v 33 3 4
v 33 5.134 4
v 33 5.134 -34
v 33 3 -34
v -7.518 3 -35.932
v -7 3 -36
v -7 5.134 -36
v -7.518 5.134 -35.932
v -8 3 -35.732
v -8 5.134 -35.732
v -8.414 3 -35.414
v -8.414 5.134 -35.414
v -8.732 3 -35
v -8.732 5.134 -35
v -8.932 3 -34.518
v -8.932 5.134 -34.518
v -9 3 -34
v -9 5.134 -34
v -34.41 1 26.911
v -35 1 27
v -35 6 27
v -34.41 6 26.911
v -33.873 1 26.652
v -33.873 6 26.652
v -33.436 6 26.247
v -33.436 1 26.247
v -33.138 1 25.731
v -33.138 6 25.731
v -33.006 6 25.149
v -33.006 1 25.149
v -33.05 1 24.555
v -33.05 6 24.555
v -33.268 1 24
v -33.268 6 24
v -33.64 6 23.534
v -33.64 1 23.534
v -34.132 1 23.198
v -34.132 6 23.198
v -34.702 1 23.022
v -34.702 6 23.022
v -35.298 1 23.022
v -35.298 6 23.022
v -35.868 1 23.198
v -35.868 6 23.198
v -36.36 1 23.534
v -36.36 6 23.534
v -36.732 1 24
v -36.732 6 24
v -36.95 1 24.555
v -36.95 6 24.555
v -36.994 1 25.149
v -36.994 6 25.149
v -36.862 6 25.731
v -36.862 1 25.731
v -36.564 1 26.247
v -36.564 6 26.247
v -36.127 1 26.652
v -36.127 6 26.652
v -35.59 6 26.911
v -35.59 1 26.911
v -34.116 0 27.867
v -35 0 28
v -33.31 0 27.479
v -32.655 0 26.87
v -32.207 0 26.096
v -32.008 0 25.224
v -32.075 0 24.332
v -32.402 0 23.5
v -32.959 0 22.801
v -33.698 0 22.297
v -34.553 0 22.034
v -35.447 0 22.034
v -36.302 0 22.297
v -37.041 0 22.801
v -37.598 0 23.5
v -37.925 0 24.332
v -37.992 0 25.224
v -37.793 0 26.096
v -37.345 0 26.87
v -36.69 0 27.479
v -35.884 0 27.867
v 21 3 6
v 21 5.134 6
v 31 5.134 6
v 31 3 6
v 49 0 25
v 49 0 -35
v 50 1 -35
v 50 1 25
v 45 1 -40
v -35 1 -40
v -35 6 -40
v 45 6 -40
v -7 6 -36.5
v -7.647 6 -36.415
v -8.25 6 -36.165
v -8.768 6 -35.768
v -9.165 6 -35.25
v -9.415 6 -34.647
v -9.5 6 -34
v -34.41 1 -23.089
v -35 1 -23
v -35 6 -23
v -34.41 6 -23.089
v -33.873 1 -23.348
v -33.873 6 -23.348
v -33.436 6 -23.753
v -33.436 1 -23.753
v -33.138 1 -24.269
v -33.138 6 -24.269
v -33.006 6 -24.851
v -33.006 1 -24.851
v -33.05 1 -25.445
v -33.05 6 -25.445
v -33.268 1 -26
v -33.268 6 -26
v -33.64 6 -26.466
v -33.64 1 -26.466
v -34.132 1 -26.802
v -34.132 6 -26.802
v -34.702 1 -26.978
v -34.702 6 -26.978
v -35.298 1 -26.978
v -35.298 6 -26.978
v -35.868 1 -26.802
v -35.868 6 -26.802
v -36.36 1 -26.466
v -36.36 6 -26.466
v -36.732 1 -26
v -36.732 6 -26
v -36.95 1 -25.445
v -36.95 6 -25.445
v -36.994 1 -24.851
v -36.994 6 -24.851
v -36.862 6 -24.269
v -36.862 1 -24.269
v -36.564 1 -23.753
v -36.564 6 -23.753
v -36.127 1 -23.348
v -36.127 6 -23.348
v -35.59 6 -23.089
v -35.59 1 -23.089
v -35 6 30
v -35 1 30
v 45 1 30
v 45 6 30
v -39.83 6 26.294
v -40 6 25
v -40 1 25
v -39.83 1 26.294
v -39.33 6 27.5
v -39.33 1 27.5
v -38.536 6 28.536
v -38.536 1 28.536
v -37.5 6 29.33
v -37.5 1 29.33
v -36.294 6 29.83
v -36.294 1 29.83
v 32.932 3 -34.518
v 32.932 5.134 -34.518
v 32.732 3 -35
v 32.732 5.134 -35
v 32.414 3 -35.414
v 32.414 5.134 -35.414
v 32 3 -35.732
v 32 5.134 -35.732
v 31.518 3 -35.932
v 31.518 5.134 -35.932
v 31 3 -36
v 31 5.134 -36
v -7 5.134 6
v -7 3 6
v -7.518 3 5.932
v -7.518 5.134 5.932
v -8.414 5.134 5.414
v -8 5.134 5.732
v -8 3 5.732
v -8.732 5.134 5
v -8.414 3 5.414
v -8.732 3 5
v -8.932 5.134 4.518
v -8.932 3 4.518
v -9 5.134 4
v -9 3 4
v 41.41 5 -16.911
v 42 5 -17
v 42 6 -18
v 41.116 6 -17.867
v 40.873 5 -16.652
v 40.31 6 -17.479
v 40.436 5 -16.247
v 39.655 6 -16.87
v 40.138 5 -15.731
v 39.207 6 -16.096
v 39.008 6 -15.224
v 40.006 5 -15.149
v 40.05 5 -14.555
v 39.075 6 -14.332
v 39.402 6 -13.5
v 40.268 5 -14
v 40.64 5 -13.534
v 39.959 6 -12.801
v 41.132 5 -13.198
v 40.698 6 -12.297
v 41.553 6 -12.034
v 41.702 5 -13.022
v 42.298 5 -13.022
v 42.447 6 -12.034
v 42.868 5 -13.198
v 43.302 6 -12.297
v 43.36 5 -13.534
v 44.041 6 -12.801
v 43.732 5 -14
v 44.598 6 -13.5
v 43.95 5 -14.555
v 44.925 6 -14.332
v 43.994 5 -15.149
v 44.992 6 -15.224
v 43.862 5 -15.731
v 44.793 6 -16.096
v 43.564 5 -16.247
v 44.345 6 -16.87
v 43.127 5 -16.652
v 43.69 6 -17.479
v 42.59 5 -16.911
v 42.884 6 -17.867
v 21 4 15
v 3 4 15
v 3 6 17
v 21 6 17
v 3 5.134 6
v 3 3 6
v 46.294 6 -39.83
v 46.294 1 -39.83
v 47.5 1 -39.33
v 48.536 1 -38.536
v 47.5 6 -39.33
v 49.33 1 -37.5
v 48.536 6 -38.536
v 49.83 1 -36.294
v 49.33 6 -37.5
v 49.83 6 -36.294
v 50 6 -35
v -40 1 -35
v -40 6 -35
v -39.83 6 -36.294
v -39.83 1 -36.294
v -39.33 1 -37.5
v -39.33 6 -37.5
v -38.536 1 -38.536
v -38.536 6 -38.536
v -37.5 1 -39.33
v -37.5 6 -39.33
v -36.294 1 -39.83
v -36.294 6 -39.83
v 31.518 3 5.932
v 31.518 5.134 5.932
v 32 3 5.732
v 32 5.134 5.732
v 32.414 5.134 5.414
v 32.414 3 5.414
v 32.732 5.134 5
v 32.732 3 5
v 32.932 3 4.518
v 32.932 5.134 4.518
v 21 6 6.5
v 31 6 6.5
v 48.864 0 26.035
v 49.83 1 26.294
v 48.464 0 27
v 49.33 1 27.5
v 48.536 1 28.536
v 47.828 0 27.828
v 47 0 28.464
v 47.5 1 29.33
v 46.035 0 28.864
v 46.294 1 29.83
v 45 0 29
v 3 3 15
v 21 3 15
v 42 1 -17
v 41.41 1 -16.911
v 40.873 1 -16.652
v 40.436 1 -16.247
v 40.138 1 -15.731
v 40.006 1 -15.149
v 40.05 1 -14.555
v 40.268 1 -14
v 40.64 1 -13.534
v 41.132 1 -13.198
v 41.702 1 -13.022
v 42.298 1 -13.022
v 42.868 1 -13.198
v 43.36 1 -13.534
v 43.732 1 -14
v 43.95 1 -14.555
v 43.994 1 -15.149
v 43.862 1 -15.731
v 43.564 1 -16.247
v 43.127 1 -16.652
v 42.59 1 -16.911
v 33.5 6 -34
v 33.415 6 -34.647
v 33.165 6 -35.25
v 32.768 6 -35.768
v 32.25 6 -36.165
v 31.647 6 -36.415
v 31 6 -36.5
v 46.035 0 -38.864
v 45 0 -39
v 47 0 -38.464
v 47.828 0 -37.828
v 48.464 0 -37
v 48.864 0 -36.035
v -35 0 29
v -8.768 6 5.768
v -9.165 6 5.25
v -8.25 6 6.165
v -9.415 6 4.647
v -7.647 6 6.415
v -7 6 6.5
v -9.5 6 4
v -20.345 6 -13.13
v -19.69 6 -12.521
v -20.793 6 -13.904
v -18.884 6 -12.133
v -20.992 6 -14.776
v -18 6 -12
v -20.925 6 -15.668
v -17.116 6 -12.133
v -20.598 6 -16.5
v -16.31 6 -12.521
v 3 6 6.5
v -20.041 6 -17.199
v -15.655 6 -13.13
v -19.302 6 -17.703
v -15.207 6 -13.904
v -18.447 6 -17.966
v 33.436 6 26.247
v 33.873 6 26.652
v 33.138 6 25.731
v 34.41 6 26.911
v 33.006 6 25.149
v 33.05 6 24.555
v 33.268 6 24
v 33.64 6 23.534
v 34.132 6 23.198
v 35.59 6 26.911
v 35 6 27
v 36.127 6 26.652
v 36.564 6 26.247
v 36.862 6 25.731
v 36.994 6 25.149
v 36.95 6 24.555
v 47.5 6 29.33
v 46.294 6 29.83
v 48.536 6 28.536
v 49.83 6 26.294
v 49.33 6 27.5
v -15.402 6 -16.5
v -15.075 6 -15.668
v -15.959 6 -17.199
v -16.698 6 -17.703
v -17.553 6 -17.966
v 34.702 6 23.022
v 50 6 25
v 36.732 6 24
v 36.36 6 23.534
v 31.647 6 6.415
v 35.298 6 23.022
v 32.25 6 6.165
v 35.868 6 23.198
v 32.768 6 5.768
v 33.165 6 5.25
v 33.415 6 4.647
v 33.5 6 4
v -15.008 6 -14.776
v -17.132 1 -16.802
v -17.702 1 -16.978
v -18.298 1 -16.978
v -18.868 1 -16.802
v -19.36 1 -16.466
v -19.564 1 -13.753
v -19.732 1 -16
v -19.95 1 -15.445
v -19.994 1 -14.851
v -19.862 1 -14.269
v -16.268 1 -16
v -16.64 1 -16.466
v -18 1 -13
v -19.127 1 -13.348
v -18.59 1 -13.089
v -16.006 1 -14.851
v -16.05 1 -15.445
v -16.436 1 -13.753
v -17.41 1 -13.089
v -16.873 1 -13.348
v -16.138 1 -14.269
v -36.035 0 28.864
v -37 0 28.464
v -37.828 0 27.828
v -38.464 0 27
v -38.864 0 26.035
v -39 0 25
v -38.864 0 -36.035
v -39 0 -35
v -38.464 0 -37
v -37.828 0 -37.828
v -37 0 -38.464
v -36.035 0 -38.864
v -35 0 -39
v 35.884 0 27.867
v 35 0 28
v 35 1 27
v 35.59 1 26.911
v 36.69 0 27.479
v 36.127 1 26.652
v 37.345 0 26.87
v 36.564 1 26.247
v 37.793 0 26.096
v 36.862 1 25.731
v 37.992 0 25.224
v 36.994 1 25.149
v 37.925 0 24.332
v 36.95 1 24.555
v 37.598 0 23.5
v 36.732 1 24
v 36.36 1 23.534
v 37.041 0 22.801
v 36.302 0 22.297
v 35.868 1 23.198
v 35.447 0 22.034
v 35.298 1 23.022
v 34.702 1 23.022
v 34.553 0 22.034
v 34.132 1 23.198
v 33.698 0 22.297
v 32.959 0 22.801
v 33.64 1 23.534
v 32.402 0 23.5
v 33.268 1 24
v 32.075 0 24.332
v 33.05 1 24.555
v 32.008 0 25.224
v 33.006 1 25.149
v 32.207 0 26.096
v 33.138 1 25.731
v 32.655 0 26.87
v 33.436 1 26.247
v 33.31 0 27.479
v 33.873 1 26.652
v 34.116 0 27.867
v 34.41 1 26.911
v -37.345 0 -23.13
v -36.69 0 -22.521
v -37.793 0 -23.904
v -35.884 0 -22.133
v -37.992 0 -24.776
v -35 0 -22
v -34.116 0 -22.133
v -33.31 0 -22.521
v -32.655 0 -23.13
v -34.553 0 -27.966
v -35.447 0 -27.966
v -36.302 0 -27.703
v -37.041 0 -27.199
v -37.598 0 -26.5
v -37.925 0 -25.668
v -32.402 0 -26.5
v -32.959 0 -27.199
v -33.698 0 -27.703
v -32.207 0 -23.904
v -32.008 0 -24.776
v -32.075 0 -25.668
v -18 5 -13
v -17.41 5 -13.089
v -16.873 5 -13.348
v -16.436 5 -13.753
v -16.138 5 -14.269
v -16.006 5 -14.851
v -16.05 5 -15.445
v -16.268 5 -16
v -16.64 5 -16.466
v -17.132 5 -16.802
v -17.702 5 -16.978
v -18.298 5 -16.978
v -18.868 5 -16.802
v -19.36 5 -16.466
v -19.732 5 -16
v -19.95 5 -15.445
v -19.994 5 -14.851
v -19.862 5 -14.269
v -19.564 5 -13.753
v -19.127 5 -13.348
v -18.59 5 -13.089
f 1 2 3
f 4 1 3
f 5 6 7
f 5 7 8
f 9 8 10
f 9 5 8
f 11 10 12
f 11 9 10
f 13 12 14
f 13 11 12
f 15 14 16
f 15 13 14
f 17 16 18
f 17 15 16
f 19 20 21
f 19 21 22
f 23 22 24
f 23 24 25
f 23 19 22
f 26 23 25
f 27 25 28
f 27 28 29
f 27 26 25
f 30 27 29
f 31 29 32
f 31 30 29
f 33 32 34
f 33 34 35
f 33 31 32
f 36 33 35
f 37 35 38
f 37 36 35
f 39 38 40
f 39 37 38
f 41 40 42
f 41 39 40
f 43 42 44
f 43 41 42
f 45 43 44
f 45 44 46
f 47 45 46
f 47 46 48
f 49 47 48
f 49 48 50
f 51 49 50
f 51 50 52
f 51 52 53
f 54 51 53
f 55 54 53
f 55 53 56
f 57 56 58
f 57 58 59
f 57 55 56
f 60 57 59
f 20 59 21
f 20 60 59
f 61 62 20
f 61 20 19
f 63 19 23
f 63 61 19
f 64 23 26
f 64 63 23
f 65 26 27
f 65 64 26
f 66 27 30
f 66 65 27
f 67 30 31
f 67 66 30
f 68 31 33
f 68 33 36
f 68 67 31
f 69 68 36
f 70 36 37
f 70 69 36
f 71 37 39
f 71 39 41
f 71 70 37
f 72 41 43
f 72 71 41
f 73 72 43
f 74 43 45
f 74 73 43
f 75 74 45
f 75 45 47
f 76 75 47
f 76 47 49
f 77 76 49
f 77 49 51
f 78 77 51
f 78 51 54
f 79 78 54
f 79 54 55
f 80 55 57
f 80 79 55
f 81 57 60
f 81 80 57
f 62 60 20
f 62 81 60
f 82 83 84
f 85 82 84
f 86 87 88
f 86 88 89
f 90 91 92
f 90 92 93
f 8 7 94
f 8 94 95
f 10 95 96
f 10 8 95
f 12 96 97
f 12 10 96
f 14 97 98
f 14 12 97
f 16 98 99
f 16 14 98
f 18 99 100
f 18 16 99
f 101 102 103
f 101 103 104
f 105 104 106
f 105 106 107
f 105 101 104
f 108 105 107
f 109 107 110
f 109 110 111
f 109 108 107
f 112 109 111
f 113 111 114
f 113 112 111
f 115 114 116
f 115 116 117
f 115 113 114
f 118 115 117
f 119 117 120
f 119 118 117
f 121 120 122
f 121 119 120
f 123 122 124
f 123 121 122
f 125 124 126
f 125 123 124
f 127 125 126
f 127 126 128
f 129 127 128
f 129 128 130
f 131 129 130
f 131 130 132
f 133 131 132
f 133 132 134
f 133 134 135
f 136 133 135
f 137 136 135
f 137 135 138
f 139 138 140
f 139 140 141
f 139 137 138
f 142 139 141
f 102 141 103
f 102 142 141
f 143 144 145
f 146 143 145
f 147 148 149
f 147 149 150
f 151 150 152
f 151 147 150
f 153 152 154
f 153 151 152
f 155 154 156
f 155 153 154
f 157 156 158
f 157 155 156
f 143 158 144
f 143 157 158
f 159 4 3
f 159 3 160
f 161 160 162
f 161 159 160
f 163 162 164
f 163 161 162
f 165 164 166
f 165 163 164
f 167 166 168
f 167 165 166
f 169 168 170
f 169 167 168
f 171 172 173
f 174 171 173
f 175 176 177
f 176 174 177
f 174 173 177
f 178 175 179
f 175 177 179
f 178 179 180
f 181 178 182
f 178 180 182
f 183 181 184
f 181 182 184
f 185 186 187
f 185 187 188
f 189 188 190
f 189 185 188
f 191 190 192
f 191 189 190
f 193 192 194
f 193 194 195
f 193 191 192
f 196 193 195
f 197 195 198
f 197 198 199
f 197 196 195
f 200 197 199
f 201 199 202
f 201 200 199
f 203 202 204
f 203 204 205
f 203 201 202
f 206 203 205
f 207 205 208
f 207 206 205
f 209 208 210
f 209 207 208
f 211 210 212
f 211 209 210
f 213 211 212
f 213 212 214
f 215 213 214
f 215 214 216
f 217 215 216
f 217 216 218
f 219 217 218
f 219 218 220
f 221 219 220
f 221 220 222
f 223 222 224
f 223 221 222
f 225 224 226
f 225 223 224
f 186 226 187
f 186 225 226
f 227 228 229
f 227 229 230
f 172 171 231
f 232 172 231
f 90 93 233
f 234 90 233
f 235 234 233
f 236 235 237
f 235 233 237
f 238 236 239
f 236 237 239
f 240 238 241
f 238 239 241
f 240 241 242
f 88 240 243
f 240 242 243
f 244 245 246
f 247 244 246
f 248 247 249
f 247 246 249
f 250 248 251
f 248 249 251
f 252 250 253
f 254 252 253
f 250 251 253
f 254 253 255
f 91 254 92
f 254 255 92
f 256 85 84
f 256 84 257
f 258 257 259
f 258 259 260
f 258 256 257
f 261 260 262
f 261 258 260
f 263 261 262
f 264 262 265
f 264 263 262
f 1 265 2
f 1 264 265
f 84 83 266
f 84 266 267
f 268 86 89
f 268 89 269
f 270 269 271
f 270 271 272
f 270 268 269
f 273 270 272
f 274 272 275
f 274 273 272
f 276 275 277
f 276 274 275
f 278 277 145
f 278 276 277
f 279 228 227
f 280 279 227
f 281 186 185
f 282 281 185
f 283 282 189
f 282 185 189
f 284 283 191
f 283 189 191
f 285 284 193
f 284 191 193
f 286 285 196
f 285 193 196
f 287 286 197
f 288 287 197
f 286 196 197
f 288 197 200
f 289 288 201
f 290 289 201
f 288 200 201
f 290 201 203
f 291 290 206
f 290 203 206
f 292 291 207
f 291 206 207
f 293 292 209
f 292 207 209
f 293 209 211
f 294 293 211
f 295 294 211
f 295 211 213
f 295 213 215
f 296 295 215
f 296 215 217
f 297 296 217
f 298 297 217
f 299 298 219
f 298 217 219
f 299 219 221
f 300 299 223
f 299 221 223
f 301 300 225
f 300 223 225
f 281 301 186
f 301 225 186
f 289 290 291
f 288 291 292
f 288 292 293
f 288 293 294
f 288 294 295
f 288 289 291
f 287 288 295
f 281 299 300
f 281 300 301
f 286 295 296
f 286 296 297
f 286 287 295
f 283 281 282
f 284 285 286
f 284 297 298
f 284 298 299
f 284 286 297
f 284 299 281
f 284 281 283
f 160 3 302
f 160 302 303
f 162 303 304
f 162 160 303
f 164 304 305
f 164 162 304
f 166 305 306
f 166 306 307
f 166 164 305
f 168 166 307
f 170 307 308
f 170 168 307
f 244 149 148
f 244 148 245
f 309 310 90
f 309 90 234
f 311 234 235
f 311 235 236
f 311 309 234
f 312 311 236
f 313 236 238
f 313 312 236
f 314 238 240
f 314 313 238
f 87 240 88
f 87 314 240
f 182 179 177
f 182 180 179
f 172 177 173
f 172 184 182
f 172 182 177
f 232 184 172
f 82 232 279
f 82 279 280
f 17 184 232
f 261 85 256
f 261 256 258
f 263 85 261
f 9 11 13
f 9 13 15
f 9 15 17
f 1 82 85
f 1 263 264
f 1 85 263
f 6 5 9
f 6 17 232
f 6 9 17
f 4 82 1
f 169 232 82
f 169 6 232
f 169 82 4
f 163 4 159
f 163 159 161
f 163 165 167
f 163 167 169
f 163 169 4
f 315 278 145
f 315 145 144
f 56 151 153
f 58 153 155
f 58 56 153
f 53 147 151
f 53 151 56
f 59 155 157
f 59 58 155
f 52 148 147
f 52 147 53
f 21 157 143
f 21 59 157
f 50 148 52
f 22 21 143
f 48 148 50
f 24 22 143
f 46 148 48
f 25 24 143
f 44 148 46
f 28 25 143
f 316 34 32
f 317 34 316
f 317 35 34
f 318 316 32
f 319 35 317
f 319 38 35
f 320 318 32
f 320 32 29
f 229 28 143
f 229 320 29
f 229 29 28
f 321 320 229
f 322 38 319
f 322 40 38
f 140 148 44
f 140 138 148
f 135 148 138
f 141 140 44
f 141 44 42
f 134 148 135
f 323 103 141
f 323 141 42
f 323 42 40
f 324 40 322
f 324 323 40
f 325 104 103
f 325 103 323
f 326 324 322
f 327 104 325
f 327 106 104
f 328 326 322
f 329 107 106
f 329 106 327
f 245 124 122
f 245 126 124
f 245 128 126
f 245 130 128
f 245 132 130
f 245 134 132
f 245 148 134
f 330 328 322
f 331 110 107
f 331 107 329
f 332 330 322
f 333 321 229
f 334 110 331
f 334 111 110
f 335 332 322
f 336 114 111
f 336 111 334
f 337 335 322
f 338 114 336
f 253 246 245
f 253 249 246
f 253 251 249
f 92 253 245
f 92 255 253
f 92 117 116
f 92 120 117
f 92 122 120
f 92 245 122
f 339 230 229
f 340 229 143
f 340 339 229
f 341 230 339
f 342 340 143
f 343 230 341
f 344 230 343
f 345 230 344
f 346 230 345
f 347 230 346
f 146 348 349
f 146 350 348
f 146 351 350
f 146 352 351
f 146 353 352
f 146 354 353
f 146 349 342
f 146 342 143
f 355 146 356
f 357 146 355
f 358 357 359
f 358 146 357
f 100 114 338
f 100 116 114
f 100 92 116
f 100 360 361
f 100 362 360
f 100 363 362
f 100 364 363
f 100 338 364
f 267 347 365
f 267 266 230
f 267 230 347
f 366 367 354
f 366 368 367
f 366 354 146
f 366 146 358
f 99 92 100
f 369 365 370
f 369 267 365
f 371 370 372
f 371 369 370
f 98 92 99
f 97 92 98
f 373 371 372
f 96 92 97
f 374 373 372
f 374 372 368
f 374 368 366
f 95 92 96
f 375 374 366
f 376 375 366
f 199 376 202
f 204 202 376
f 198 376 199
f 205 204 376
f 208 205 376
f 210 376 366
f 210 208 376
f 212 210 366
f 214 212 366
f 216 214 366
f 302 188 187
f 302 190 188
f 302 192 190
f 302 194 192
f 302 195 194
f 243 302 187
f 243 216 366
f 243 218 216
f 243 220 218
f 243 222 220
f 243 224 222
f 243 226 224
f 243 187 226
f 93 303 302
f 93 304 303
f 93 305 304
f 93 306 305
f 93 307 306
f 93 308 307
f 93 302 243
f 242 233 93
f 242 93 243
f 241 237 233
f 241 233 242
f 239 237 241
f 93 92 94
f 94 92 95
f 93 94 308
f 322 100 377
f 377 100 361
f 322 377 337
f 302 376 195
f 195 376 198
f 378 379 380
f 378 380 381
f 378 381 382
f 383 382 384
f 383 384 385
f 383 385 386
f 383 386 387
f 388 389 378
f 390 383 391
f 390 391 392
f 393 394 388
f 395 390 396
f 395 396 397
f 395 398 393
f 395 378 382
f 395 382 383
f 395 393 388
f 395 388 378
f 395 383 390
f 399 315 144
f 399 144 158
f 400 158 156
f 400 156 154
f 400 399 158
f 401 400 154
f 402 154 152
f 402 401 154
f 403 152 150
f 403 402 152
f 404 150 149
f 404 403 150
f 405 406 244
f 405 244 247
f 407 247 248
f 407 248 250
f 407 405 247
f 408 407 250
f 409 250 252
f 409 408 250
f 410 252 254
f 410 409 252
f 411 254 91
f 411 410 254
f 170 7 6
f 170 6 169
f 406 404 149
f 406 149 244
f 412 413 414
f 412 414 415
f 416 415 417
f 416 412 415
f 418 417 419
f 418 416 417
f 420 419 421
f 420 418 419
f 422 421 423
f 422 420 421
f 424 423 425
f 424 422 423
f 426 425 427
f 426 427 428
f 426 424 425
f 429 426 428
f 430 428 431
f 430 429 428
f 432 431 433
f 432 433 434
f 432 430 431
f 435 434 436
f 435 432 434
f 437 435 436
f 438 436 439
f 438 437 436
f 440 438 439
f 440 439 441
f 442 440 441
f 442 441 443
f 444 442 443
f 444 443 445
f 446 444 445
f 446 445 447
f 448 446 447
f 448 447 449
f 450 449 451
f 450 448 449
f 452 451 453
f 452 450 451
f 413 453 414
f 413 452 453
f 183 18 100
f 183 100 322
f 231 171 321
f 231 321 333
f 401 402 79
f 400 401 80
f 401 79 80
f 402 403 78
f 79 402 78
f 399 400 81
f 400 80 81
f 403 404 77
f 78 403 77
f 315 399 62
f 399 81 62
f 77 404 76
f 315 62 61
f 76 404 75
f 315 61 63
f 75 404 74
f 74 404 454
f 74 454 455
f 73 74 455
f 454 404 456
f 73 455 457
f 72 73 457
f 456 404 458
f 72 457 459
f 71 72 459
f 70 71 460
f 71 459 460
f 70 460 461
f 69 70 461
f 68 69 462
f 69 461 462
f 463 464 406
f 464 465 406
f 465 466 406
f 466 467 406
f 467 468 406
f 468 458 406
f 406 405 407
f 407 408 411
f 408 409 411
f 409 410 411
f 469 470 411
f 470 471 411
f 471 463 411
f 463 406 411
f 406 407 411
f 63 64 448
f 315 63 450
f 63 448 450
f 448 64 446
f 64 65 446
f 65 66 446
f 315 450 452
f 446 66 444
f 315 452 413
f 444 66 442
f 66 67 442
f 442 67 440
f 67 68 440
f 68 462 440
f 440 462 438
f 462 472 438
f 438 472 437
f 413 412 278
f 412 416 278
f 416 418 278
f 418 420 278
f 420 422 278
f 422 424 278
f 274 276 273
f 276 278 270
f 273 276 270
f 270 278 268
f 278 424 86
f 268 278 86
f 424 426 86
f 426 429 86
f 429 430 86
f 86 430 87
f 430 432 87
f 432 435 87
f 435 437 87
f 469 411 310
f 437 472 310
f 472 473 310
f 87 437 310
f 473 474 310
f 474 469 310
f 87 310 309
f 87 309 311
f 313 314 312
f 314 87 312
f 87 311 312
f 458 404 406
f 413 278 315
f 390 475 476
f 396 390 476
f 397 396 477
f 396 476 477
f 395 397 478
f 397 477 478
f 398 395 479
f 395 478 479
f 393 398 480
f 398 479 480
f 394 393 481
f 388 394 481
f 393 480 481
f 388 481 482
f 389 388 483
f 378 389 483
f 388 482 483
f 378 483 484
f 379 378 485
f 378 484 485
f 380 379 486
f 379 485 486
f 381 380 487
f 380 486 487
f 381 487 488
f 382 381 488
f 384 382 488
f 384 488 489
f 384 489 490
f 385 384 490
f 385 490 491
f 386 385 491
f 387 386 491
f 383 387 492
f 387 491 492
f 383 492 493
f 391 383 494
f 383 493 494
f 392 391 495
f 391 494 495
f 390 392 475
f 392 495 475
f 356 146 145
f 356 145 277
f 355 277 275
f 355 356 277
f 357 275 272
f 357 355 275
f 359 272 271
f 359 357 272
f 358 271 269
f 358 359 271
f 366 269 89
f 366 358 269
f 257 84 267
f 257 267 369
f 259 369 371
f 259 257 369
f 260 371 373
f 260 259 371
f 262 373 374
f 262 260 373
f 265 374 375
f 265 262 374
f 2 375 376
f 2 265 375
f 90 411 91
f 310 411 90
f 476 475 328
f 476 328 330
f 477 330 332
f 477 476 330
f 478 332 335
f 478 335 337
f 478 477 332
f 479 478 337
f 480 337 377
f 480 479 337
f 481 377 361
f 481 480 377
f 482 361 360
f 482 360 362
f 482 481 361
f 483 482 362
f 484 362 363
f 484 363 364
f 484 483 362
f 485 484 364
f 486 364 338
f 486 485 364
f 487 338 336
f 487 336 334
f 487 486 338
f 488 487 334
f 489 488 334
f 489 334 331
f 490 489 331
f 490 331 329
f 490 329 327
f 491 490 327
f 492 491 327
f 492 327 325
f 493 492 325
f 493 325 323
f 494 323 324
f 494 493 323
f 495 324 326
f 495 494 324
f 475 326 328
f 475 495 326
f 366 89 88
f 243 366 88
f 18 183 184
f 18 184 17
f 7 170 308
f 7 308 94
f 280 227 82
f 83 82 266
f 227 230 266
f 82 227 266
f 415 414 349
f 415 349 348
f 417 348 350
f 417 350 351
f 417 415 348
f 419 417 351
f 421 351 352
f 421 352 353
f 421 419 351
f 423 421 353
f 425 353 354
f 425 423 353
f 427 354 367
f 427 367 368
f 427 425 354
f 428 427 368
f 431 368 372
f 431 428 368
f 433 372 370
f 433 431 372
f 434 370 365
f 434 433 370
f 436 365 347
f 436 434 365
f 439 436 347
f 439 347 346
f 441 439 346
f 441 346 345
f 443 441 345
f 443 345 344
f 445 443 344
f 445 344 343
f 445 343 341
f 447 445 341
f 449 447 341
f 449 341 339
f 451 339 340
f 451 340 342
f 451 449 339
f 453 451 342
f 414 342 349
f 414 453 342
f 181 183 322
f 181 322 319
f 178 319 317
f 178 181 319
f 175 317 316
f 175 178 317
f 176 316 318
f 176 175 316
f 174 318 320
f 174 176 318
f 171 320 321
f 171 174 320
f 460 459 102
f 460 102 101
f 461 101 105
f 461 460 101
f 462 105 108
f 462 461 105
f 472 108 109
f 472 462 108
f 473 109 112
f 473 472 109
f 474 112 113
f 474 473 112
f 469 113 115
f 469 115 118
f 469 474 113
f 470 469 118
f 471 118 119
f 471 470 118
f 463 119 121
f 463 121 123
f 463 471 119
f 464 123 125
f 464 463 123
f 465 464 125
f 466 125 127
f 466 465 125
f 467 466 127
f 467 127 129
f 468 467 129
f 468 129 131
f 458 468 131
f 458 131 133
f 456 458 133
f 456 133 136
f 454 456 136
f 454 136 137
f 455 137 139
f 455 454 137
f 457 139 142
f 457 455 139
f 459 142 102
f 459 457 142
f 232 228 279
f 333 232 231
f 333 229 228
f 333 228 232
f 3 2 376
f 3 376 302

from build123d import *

# Parameters (mm, degrees)
SKETCH_1_W          = 90
SKETCH_1_H          = 70
SKETCH_1_R          = 2
EXTRUDE_1_DEPTH     = 6
FILLET_1_R          = 5
SKETCH_2_W          = 42
SKETCH_2_H          = 42
CUT_EXTRUDE_1_DEPTH = 3
SKETCH_3_W          = 18
SKETCH_3_H          = 18
CUT_EXTRUDE_2_DEPTH = 3
FILLET_2_R          = 2
CHAMFER_1_SIZE      = 2
SKETCH_4_R          = 2
CUT_EXTRUDE_3_DEPTH = 5
CHAMFER_2_SIZE      = 1
CHAMFER_3_SIZE      = 1
CHAMFER_4_SIZE      = 0.5
CHAMFER_4_SIZE2     = 0.866025404


with BuildPart() as part:
    # Эскиз1 → Бобышка-Вытянуть1 (new body)
    # profile 1 of 2: a face of its own
    with BuildSketch(Plane(origin=(0, 0, 0), x_dir=(1, 0, 0), z_dir=(0, 1, 0))):
        with Locations((5, 5)):
            Rectangle(SKETCH_1_W, SKETCH_1_H)
        with Locations(Location((35, -25, 0), (0, 0, 270))):
            Circle(SKETCH_1_R, mode=Mode.SUBTRACT)
        with Locations(Location((-35, -25, 0), (0, 0, 270))):
            Circle(SKETCH_1_R, mode=Mode.SUBTRACT)
        with Locations((35, 25)):
            Circle(SKETCH_1_R, mode=Mode.SUBTRACT)
        with Locations(Location((-35, 25, 0), (0, 0, 270))):
            Circle(SKETCH_1_R, mode=Mode.SUBTRACT)
    # profile 2 of 2: a face of its own
    with BuildSketch(Plane(origin=(0, 0, 0), x_dir=(1, 0, 0), z_dir=(0, 1, 0))):
        with Locations((35, 25)):
            Circle(SKETCH_1_R)
    extrude(amount=EXTRUDE_1_DEPTH)

    # Скругление1
    fillet_1_edges = [part.edges().sort_by_distance(p)[0] for p in [
        (-40, 3, 30),
        (-40, 3, -40),
        (50, 3, -40),
        (50, 3, 30),
    ]]
    fillet(fillet_1_edges, radius=FILLET_1_R)

    # Эскиз2 → Вырез-Вытянуть1 (cut)
    with BuildSketch(Plane(origin=(0, 6, 0), x_dir=(1, 0, 0), z_dir=(0, 1, 0))):
        with Locations((12, 15)):
            Rectangle(SKETCH_2_W, SKETCH_2_H)
    extrude(amount=-CUT_EXTRUDE_1_DEPTH, mode=Mode.SUBTRACT)

    # Эскиз3 → Вырез-Вытянуть2 (cut)
    with BuildSketch(Plane(origin=(0, 6, 0), x_dir=(1, 0, 0), z_dir=(0, 1, 0))):
        with Locations((12, -6)):
            Rectangle(SKETCH_3_W, SKETCH_3_H)
    extrude(amount=-CUT_EXTRUDE_2_DEPTH, mode=Mode.SUBTRACT)

    # Скругление2
    fillet_2_edges = [part.edges().sort_by_distance(p)[0] for p in [
        (33, 4.5, -36),
        (33, 4.5, 6),
        (-9, 4.5, 6),
        (-9, 4.5, -36),
    ]]
    fillet(fillet_2_edges, radius=FILLET_2_R)

    # Фаска1
    chamfer_1_edges = [part.edges().sort_by_distance(p)[0] for p in [
        (12, 6, 15),
    ]]
    chamfer(chamfer_1_edges, length=CHAMFER_1_SIZE)

    # Эскиз4 → Вырез-Вытянуть3 (cut)
    with BuildSketch(Plane(origin=(0, 6, 0), x_dir=(1, 0, 0), z_dir=(0, 1, 0))):
        with Locations(Location((-18, 15, 0), (0, 0, 270))):
            Circle(SKETCH_4_R)
        with Locations(Location((42, 15, 0), (0, 0, 90))):
            Circle(SKETCH_4_R)
    extrude(amount=-CUT_EXTRUDE_3_DEPTH, mode=Mode.SUBTRACT)

    # Фаска2
    chamfer_2_edges = [part.edges().sort_by_distance(p)[0] for p in [
        (-18, 6, -17),
        (42, 6, -13),
    ]]
    chamfer(chamfer_2_edges, length=CHAMFER_2_SIZE)

    # Фаска3
    chamfer_3_edges = [part.edges().sort_by_distance(p)[0] for p in [
        (-35, 0, -27),
        (-35, 0, 23),
        (35, 0, 23),
        (-40, 0, -5),
        (5, 0, 30),
        (5, 0, -40),
        (50, 0, -5),
        (-38.535533906, 0, 28.535533906),
        (48.535533906, 0, 28.535533906),
        (48.535533906, 0, -38.535533906),
        (-38.535533906, 0, -38.535533906),
    ]]
    chamfer(chamfer_3_edges, length=CHAMFER_3_SIZE)

    # Фаска4
    chamfer_4_edges = [part.edges().sort_by_distance(p)[0] for p in [
        (26, 6, 6),
        (33, 6, -15),
        (-2, 6, 6),
        (-9, 6, -15),
        (12, 6, -36),
        (32.414213562, 6, 5.414213562),
        (-8.414213562, 6, 5.414213562),
        (-8.414213562, 6, -35.414213562),
        (32.414213562, 6, -35.414213562),
    ]]
    chamfer_4_side = [part.faces().sort_by_distance(p)[0] for p in [
        (-18, 6, -19.140175425),
    ]]
    chamfer(chamfer_4_edges, length=CHAMFER_4_SIZE, length2=CHAMFER_4_SIZE2, reference=chamfer_4_side[0])


solid = part.part
